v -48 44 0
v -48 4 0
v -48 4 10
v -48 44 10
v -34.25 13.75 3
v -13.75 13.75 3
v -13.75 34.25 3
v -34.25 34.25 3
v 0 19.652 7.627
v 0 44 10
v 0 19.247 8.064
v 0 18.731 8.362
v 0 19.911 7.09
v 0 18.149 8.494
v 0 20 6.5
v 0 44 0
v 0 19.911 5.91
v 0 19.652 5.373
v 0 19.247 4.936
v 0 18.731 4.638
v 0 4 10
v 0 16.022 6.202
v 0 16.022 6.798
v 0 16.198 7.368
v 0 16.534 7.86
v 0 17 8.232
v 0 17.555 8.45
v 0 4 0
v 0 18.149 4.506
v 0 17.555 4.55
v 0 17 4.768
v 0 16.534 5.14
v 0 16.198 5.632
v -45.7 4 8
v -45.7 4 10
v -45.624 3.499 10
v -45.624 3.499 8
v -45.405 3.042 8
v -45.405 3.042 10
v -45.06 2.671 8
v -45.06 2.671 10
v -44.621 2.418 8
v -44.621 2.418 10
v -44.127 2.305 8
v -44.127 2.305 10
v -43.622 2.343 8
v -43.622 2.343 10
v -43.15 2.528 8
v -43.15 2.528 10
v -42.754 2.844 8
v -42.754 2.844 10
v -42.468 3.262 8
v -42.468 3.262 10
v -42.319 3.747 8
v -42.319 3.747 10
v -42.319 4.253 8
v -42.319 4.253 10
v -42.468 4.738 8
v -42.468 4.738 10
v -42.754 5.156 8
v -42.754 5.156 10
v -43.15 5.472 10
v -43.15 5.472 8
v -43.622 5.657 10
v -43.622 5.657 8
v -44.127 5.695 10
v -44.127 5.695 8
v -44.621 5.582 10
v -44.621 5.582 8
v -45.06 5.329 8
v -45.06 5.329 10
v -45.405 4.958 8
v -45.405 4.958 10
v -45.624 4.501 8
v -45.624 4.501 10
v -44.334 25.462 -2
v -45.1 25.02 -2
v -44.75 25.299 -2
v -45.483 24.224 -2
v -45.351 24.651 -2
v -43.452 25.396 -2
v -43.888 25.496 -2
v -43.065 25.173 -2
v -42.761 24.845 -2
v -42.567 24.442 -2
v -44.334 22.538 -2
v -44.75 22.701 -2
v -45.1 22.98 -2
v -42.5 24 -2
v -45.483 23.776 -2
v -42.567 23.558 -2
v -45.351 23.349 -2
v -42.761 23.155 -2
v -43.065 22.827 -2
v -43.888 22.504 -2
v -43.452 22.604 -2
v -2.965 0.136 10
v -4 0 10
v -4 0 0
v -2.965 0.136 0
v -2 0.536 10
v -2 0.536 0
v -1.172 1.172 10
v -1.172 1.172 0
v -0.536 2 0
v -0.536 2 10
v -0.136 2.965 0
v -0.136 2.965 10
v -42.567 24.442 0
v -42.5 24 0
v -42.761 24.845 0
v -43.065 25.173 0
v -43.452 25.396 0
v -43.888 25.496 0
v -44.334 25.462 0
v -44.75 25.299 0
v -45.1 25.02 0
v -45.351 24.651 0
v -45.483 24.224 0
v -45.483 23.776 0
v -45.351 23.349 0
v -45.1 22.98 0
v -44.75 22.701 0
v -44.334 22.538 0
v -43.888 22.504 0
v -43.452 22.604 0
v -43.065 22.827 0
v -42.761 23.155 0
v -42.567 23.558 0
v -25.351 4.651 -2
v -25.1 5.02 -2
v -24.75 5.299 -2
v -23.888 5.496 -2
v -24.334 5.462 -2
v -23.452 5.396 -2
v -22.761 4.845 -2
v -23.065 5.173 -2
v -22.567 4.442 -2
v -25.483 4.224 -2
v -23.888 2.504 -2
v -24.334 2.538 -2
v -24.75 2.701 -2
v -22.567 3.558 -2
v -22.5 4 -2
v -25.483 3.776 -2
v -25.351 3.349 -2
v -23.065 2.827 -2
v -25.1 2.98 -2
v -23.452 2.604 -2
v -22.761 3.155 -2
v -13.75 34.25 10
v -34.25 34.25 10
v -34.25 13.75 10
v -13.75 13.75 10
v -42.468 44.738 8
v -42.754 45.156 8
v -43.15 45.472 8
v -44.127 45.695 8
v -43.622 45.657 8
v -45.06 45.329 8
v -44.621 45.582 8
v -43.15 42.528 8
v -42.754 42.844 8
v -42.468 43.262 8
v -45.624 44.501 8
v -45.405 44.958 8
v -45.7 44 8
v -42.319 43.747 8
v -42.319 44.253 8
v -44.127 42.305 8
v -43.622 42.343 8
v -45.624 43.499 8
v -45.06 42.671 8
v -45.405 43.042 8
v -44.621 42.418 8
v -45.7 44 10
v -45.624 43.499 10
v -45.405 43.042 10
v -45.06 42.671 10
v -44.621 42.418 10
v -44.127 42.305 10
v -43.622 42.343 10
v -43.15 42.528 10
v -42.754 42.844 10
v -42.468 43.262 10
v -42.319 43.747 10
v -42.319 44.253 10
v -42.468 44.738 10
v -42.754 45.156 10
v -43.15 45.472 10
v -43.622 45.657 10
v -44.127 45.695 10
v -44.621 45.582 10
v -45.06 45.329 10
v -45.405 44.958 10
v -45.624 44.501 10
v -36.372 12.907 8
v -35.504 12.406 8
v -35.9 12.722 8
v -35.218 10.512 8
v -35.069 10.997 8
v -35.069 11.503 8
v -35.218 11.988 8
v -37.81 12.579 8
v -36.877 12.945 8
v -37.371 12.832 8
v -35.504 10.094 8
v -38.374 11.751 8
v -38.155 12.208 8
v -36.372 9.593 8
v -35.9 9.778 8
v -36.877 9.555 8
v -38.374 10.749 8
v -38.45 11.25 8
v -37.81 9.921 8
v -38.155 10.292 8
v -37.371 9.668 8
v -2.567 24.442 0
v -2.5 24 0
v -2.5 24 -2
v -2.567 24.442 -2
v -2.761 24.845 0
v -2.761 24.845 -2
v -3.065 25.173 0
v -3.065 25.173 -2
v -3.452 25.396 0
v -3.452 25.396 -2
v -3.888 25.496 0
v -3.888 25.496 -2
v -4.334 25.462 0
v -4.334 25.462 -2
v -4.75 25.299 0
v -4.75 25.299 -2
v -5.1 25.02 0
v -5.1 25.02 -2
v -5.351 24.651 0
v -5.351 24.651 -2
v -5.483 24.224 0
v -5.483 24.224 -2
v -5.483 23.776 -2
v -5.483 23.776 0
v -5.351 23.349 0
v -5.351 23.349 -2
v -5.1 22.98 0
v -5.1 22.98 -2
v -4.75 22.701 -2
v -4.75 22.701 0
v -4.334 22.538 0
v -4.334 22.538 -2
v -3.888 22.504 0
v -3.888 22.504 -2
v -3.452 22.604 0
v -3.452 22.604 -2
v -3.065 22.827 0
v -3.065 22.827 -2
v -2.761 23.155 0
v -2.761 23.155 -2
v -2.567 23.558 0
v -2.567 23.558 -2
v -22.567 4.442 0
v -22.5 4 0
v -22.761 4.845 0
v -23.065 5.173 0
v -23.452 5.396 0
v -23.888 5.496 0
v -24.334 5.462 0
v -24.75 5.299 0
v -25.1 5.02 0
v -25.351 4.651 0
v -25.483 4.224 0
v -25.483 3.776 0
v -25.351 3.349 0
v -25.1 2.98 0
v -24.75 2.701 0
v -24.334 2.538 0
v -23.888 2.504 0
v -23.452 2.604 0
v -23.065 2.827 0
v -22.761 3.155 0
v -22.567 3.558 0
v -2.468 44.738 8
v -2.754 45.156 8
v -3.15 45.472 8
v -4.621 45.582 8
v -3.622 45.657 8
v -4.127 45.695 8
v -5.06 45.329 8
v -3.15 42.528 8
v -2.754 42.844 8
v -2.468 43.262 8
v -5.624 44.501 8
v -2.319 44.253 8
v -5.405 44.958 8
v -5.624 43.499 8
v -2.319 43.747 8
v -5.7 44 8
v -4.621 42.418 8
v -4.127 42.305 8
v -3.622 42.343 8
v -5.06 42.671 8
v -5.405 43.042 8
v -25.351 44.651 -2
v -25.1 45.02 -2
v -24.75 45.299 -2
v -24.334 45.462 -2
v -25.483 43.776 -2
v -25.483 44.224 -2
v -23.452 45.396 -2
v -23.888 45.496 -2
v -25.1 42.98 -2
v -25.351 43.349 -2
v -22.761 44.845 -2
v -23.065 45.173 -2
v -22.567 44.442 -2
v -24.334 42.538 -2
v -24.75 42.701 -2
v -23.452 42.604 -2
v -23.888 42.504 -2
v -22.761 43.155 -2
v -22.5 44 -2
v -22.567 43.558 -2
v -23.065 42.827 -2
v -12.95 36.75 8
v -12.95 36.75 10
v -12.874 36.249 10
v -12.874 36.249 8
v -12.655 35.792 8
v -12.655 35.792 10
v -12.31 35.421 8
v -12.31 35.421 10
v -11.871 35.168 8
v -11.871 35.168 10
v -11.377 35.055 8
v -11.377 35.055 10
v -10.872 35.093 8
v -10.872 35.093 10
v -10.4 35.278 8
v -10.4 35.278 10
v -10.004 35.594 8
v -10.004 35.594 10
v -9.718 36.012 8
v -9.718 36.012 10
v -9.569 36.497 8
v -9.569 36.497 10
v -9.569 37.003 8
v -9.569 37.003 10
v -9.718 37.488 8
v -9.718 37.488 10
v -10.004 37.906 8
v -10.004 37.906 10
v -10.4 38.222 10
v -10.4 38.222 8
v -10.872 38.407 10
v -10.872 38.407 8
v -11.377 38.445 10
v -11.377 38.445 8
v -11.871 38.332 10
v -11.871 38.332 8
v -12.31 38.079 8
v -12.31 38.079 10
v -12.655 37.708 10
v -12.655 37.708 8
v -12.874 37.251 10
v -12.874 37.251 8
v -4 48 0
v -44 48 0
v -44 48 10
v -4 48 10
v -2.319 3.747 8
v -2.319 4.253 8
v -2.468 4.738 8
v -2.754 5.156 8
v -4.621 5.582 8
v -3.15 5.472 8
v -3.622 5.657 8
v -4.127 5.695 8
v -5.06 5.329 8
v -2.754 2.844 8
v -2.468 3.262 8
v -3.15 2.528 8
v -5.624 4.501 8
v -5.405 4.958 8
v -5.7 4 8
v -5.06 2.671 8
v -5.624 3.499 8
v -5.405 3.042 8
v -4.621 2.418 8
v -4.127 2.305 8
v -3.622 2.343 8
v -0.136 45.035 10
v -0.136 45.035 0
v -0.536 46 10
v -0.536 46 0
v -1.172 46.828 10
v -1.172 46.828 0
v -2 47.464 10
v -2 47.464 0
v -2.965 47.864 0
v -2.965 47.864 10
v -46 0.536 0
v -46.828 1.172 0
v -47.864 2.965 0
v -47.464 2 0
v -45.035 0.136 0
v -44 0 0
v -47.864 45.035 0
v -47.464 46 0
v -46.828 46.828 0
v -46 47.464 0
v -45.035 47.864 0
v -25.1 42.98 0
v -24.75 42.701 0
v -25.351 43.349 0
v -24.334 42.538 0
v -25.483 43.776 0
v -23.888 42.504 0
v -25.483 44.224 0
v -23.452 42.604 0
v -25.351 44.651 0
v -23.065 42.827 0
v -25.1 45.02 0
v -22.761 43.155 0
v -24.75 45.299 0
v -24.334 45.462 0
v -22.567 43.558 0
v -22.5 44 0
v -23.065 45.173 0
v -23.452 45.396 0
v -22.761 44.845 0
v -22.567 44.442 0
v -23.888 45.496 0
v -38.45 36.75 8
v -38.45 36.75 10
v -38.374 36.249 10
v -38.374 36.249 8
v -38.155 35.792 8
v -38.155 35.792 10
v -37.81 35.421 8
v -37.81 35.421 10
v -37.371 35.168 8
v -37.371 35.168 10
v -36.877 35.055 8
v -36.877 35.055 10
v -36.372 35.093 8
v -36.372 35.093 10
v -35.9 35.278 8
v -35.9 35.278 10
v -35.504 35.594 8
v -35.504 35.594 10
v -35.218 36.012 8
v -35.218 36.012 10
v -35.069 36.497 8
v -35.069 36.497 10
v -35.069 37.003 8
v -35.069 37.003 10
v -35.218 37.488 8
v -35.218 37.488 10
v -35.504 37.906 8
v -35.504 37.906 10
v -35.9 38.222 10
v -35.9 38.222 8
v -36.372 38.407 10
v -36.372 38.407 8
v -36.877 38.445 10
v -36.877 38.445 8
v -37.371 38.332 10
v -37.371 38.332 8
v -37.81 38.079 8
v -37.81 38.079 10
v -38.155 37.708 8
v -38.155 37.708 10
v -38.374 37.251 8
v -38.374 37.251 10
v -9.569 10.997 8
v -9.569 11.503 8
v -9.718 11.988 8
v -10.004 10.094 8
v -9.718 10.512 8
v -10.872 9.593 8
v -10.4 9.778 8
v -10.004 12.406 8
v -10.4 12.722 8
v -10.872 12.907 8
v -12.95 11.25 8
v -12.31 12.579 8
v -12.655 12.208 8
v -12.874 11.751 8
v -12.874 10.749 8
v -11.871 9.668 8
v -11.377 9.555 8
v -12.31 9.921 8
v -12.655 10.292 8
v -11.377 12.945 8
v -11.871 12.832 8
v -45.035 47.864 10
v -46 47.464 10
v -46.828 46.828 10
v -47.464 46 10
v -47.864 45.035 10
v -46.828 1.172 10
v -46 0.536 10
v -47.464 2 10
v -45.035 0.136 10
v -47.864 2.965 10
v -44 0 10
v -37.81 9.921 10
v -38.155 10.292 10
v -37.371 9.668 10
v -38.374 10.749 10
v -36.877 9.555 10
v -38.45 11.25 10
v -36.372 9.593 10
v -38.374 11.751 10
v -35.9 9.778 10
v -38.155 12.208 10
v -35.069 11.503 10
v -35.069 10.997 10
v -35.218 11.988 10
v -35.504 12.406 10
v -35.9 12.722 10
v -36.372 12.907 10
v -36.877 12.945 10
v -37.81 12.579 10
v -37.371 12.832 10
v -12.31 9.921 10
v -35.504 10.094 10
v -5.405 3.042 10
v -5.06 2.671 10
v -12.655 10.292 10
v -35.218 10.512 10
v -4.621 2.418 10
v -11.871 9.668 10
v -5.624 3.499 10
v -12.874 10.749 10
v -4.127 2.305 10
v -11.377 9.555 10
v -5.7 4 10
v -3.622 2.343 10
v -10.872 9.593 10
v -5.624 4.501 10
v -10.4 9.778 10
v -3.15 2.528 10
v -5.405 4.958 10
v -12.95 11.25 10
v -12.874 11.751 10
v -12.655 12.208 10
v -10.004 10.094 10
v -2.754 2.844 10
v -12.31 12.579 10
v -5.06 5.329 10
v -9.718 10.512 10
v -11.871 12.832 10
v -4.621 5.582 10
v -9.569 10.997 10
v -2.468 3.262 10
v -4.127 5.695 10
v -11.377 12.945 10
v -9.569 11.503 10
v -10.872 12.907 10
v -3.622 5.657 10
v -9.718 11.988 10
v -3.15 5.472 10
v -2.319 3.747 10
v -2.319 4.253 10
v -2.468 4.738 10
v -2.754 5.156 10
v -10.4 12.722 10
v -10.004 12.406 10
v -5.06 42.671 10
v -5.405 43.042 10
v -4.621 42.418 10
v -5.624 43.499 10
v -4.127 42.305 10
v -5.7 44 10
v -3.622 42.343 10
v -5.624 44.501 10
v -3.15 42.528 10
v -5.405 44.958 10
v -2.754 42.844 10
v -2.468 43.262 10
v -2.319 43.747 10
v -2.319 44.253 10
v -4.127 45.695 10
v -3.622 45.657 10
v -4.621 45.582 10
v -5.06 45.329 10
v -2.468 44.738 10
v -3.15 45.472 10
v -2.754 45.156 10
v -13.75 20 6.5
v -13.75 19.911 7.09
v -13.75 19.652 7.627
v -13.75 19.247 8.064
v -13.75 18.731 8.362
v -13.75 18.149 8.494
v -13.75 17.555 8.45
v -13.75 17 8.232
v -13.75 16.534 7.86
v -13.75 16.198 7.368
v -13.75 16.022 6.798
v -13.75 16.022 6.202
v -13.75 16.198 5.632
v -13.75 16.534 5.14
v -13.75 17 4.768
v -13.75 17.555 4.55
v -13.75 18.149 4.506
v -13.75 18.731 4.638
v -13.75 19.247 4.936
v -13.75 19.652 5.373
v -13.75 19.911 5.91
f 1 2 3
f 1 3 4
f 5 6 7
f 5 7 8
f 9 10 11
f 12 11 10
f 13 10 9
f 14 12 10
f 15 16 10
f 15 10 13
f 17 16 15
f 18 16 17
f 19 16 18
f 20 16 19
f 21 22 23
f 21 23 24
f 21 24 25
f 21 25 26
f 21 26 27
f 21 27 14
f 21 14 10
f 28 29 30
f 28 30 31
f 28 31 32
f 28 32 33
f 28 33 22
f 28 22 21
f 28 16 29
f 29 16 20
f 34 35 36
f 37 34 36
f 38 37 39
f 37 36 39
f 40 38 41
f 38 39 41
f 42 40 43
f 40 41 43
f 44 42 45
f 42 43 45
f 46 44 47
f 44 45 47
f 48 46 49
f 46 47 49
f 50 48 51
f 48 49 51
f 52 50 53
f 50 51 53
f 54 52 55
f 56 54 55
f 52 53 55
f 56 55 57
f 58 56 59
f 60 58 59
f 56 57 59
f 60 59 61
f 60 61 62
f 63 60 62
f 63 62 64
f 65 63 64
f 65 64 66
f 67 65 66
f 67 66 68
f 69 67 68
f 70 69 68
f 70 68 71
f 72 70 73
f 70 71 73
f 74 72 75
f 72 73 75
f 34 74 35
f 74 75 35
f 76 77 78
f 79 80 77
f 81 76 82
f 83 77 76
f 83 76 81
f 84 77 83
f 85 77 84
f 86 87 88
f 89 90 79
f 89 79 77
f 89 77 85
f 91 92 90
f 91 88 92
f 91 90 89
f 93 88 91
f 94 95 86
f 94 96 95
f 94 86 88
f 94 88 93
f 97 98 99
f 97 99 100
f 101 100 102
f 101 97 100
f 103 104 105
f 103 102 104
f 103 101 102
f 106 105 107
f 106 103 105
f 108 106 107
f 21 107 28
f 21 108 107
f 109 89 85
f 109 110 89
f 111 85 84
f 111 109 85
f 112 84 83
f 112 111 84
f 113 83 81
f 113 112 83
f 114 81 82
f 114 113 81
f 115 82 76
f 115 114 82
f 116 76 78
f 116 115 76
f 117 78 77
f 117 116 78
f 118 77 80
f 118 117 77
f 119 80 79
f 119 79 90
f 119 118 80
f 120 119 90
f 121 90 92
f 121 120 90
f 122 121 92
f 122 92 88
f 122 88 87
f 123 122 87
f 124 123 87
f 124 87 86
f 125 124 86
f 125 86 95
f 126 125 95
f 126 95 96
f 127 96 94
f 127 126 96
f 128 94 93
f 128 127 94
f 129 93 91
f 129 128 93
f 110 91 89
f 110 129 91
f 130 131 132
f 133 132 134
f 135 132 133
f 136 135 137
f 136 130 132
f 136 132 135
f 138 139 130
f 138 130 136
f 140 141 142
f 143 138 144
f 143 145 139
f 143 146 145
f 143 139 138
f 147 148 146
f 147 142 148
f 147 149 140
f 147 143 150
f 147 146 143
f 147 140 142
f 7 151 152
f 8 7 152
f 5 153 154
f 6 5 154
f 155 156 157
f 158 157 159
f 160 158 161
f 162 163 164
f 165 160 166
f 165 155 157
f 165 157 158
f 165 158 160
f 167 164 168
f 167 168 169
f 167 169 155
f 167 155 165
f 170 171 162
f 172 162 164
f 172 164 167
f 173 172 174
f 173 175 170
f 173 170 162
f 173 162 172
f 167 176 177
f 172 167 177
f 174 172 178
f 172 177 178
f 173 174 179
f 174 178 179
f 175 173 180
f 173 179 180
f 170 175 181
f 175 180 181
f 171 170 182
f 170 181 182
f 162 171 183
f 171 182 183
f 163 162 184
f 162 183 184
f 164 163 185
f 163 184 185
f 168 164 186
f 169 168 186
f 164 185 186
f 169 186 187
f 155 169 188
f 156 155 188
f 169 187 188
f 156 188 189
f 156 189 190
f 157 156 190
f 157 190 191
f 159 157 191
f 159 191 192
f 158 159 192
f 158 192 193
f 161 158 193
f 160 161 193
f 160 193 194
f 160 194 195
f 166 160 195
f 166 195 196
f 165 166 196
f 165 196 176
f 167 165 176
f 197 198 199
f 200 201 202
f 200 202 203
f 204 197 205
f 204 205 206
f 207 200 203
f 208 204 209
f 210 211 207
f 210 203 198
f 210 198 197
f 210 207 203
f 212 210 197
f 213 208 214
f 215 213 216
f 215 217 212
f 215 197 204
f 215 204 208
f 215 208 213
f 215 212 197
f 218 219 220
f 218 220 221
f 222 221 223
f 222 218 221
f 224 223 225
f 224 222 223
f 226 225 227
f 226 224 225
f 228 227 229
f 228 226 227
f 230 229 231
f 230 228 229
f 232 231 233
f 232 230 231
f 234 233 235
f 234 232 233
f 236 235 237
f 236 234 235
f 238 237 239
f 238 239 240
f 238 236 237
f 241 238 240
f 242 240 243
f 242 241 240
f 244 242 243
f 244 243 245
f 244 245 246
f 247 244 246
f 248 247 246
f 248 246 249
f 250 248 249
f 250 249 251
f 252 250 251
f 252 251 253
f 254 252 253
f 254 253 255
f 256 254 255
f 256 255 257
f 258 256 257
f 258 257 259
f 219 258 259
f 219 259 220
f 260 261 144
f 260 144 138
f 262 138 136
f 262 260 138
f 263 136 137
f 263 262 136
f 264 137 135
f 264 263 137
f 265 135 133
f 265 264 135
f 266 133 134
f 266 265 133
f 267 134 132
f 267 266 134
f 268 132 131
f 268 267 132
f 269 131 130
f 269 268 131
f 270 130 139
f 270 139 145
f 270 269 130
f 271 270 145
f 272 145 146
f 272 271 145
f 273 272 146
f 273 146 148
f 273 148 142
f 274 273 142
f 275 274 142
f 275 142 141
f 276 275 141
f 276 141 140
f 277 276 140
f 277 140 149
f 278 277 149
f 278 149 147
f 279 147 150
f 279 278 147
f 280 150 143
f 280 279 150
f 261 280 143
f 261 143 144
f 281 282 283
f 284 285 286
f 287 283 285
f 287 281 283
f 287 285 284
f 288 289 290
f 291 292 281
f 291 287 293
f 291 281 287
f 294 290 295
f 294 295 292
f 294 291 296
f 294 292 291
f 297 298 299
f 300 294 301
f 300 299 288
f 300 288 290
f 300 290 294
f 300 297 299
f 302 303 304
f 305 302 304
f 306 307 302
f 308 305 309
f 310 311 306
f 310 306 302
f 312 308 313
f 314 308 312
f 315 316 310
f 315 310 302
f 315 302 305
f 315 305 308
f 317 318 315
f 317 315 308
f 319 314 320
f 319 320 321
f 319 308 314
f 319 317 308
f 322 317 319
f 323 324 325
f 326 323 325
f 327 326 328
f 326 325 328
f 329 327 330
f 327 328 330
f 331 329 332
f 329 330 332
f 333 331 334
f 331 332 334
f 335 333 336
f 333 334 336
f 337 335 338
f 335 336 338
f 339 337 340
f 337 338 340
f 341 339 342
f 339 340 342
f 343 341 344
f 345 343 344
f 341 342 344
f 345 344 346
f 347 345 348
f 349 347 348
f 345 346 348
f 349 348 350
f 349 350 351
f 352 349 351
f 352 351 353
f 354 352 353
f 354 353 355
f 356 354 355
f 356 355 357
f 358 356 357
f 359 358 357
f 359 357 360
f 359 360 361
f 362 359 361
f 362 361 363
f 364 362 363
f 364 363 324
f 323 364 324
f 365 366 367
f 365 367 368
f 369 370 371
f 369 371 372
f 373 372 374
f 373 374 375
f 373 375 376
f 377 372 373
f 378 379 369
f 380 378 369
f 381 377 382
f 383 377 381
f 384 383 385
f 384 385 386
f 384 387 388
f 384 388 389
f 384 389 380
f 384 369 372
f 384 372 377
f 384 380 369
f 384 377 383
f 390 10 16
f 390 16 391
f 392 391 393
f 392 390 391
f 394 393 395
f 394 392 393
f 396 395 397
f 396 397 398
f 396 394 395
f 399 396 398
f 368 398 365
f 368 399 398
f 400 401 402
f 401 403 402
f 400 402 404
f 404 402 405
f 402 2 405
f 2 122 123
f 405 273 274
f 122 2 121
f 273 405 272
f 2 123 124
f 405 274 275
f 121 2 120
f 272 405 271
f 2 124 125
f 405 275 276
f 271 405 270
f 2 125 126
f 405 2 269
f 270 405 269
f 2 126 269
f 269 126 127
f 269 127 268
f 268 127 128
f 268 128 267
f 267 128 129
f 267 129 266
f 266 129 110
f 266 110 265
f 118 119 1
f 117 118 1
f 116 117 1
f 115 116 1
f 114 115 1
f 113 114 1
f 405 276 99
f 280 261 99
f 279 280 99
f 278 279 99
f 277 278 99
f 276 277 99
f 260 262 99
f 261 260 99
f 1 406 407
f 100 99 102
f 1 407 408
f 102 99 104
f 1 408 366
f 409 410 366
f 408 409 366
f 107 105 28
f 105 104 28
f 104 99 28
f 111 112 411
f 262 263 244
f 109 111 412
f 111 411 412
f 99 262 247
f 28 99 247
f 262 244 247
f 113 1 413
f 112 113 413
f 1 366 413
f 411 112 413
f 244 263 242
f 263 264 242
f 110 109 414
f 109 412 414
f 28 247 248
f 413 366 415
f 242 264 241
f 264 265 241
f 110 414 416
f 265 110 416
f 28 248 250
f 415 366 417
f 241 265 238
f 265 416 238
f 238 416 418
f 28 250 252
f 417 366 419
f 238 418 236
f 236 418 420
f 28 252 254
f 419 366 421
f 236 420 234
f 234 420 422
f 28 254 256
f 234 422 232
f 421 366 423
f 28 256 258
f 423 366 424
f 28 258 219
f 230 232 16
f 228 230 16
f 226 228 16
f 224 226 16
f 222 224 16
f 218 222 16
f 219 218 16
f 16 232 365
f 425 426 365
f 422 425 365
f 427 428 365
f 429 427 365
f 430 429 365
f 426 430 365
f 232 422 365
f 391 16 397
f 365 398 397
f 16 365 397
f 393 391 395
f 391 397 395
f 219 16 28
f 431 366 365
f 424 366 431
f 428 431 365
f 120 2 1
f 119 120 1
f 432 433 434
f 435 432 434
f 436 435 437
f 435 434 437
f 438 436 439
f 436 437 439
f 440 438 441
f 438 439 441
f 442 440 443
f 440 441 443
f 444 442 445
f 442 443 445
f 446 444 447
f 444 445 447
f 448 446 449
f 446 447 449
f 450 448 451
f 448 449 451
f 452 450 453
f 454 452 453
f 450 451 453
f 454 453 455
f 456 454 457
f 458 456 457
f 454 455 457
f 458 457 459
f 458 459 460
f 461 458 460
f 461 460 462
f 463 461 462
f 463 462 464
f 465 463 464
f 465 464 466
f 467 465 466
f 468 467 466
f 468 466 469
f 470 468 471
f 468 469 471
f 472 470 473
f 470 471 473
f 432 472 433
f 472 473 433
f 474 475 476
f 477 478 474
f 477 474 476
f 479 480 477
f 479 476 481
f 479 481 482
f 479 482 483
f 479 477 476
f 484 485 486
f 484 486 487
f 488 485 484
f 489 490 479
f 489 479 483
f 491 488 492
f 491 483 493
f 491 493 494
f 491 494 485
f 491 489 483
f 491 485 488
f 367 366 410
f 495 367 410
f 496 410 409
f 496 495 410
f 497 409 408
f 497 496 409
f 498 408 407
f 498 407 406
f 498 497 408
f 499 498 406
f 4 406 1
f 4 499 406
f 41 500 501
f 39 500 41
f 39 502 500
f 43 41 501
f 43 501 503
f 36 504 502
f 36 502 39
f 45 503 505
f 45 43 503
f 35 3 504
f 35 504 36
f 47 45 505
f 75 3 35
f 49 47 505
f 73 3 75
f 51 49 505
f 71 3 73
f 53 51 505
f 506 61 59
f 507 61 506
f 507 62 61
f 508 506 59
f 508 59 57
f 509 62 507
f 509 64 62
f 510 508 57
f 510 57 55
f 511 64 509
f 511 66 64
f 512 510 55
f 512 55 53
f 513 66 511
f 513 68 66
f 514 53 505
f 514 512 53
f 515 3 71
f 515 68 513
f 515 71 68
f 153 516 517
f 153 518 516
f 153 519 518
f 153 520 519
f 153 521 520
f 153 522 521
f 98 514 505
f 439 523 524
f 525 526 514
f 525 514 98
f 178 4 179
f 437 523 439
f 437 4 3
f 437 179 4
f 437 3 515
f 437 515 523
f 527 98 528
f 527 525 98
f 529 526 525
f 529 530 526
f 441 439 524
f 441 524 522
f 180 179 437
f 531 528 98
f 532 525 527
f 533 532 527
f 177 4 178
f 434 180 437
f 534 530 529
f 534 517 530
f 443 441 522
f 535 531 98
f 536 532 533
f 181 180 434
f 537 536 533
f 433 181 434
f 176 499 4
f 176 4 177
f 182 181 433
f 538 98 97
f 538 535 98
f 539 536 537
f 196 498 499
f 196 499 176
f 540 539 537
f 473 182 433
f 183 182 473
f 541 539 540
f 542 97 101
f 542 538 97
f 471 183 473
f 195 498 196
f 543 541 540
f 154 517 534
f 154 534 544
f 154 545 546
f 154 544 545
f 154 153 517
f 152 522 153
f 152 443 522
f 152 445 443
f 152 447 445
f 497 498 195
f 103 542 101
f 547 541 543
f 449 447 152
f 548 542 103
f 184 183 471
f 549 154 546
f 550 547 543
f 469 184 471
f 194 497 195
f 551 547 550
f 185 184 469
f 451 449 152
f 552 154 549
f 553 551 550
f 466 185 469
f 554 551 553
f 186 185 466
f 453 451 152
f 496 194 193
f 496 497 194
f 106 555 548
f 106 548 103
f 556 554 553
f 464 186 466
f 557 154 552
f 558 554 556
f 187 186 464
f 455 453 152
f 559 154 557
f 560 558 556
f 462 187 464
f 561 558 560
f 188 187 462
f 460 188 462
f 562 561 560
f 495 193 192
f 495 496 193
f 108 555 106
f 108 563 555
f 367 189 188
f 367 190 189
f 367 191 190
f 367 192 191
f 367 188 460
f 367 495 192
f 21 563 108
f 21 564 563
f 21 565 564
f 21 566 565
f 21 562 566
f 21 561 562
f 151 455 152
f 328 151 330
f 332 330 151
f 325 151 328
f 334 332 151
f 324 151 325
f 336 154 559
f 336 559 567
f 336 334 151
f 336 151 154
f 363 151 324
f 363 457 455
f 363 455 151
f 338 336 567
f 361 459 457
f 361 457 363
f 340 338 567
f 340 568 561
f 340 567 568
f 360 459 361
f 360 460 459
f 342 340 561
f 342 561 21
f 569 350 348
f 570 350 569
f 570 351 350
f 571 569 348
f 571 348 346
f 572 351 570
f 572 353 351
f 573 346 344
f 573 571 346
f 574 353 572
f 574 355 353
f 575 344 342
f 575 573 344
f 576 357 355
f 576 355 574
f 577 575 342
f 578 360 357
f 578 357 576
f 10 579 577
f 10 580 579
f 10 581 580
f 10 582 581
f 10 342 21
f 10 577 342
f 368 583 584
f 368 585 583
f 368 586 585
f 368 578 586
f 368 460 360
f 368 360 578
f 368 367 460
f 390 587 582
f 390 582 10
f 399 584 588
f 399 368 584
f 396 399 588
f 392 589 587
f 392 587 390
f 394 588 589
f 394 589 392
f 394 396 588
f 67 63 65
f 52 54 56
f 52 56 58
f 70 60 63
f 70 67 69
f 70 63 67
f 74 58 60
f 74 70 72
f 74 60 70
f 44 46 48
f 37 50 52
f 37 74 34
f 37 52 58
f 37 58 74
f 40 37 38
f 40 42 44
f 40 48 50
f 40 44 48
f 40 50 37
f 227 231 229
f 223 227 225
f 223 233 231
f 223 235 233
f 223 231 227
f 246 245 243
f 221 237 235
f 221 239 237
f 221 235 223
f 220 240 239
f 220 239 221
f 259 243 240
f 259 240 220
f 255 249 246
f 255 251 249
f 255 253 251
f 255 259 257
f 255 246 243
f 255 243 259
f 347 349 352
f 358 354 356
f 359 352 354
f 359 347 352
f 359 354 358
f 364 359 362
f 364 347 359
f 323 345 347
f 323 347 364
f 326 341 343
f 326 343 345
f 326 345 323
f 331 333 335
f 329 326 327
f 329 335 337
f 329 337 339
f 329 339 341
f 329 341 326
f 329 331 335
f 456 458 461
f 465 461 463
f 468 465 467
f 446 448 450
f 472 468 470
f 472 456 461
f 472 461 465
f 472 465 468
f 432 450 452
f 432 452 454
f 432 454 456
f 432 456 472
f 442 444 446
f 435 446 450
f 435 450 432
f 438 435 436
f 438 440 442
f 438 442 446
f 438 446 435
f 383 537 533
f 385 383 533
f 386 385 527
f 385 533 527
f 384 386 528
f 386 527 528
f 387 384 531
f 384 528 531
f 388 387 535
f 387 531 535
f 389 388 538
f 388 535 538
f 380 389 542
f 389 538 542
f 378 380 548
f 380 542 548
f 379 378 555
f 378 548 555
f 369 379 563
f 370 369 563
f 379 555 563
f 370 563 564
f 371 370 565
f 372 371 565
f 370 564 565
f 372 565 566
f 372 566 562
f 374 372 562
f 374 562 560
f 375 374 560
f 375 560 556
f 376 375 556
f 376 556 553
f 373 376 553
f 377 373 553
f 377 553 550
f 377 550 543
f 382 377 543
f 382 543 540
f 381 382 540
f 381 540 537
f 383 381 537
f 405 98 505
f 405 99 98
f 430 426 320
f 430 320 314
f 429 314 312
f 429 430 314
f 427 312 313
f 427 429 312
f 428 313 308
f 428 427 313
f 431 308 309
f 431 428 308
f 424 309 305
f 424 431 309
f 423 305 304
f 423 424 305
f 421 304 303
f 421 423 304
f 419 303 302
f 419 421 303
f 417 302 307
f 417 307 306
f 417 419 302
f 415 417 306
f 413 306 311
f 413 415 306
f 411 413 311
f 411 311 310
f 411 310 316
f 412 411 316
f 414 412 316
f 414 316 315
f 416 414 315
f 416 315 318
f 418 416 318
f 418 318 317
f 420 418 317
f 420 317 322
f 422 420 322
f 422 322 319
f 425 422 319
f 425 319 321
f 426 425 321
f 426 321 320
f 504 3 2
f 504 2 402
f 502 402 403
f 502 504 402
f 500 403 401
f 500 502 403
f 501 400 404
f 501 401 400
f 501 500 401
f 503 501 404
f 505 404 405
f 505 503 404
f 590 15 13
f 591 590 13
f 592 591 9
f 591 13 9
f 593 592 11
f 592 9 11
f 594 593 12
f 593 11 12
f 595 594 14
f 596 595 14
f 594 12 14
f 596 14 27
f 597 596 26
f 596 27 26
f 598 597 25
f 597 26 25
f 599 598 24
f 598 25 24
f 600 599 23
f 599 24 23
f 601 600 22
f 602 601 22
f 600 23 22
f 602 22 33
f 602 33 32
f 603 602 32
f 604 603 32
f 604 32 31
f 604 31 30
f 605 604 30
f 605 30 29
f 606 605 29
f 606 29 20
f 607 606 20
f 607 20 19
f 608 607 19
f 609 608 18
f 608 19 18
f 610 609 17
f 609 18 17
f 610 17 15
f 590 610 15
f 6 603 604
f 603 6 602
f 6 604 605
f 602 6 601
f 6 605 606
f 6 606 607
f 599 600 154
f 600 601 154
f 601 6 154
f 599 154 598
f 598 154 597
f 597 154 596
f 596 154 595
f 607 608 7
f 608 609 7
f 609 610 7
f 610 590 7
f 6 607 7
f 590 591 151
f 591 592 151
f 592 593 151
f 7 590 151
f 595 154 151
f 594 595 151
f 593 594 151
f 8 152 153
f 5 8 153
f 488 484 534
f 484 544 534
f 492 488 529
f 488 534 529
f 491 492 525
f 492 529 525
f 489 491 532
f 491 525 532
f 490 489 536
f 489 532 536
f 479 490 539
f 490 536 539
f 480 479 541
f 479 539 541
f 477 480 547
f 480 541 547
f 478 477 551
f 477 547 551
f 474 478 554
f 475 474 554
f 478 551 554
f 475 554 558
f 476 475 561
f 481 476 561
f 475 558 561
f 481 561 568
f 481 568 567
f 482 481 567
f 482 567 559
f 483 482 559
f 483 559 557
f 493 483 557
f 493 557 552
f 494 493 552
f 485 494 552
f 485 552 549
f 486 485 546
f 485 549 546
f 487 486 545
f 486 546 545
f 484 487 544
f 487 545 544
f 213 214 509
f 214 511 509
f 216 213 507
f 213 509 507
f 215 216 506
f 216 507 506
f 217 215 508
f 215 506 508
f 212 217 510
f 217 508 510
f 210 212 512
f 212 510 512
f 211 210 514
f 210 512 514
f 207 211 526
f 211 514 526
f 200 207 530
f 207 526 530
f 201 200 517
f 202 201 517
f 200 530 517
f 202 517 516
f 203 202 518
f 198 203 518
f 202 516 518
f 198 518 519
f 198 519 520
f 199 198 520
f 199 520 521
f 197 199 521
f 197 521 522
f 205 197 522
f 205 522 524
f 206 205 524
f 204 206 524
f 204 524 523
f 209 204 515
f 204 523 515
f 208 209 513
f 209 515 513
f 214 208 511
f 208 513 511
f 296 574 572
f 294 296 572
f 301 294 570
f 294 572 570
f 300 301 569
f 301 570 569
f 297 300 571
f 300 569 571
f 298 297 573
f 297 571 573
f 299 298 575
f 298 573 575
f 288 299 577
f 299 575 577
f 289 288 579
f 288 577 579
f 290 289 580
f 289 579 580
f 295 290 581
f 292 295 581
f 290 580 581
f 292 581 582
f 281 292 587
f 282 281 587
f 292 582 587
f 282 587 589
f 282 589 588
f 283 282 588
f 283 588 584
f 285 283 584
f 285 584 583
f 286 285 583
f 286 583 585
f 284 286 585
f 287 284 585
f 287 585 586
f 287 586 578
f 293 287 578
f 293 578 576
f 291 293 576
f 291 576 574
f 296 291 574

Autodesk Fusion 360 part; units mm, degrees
sketch "Sketch1" plane through (0, 0, 0) normal (0, 0, 1) x (1, 0, 0)
  line L0 (0, 0) -> (-48, 0)
  line L1 (-48, 0) -> (-48, 48)
  line L2 (-48, 48) -> (0, 48)
  line L3 (0, 48) -> (0, 0)
  dimension "d1" = 48
  dimension "d2" = 48
extrude "Extrude1" add sketch "Sketch1" along normal blind 10
sketch "Sketch2" plane through (0, 0, 10) normal (0, 0, 1) x (-1, 0, 0)
  line L0 (0, -48) -> (48, -48)
  line L1 (48, -48) -> (48, 0)
  line L2 (48, 0) -> (0, 0)
  line L3 (0, 0) -> (0, -48)
  line L4 (34.25, -13.75) -> (13.75, -13.75)
  line L5 (13.75, -13.75) -> (13.75, -34.25)
  line L6 (13.75, -34.25) -> (34.25, -34.25)
  line L7 (34.25, -34.25) -> (34.25, -13.75)
  line L8 (34.25, -13.75) -> (13.75, -34.25) construction
  line L9 (13.75, -13.75) -> (34.25, -34.25) construction
  point P0 (24, -24)
  dimension "d5" = 20.5
  dimension "d6" = 20.5
extrude "Extrude2" cut sketch "Sketch2" against normal blind 7 contours L4 L5 L6 L7
sketch "Sketch3" plane through (0, 0, 10) normal (0, 0, 1) x (-1, 0, 0)
  line L0 (13.75, -13.75) -> (34.25, -13.75)
  line L1 (34.25, -13.75) -> (34.25, -34.25)
  line L2 (34.25, -34.25) -> (13.75, -34.25)
  line L3 (13.75, -34.25) -> (13.75, -13.75)
  line L4 (0, -48) -> (48, -48)
  line L5 (48, -48) -> (48, 0)
  line L6 (48, 0) -> (0, 0)
  line L7 (0, 0) -> (0, -48)
sketch "Sketch4" plane through (0, 0, 0) normal (1, 0, 0) x (0, 1, 0)
  line L0 (0, 0) -> (48, 0)
  line L1 (48, 0) -> (48, 10)
  line L2 (48, 10) -> (0, 10)
  line L3 (0, 10) -> (0, 0)
  line L4 (0, 10) -> (18, 10)
  line L5 (18, 10) -> (18, 6.5)
  line L6 (18, 6.5) -> (0, 6.5)
  line L7 (0, 6.5) -> (0, 10)
  circle A0 centre (18, 6.5) radius 2
  dimension "d9" = 18
  dimension "d10" = 3.5
  dimension "d11" = 4
extrude "Extrude3" cut sketch "Sketch4" against normal blind 15 contours L5 L6 A0 | L5 L6 A0
fillet "Fillet1" radius 4 1 edges at (0, 48, 5)
fillet "Fillet2" radius 4 1 edges at (0, 0, 5)
fillet "Fillet3" radius 4 2 edges at (-48, 48, 5) (-48, 0, 5)
sketch "Sketch5" plane through (0, 0, 10) normal (0, 0, 1) x (-1, 0, 0)
  line L0 (13.75, -13.75) -> (11.25, -13.75)
  line L1 (11.25, -13.75) -> (11.25, -11.25)
  line L2 (11.25, -11.25) -> (13.75, -11.25)
  line L3 (13.75, -11.25) -> (13.75, -13.75)
  line L4 (11.25, -11.25) -> (36.75, -11.25)
  line L5 (36.75, -11.25) -> (36.75, -36.75)
  line L6 (36.75, -36.75) -> (11.25, -36.75)
  line L7 (11.25, -36.75) -> (11.25, -11.25)
  circle A0 centre (36.75, -36.75) radius 1.6
  circle A1 centre (11.25, -36.75) radius 1.6
  circle A2 centre (11.25, -11.25) radius 1.6
  circle A3 centre (36.75, -11.25) radius 1.6
  point P0 (13.75, -13.75)
  dimension "d20" = 2.5
  dimension "d21" = 2.5
  dimension "d22" = 25.5
  dimension "d23" = 25.5
  dimension "d24" = 3.2
  dimension "d25" = 3.2
  dimension "d26" = 3.2
  dimension "d27" = 3.2
extrude "Extrude4" cut sketch "Sketch5" against normal blind 2 contours L1 L2 L4 L7 A2 | L1 L2 L4 L7 A2 | L6 L7 A1 | L6 L7 A1 | L4 L5 A3 | L4 L5 A3 | L5 L6 A0 | L5 L6 A0
sketch "Sketch6" plane through (0, 0, 0) normal (0, 0, -1) x (1, 0, 0)
  arc A0 (-44, 0) -> (-48, -4) centre (-44, -4) ccw
  line L0 (-48, -4) -> (-48, -44)
  arc A1 (-48, -44) -> (-44, -48) centre (-44, -44) ccw
  line L1 (-44, -48) -> (-4, -48)
  arc A2 (-4, -48) -> (0, -44) centre (-4, -44) ccw
  line L2 (0, -44) -> (0, -4)
  arc A3 (0, -4) -> (-4, 0) centre (-4, -4) ccw
  line L3 (-4, 0) -> (-44, 0)
  line L4 (0, 0) -> (-4, 0)
  line L5 (0, -4) -> (0, 0)
  circle A4 centre (-4, -44) radius 1.5
  circle A5 centre (-44, -44) radius 1.5
  circle A6 centre (-44, -4) radius 1.5
  circle A7 centre (-4, -4) radius 1.5
  dimension "d30" = 4
  dimension "d31" = 40
  dimension "d33" = 3
  dimension "d34" = 3
  dimension "d35" = 3
  dimension "d36" = 3
extrude "Extrude5" add sketch "Sketch6" along normal blind 2 contours A4 | A5 | A6 | A7
sketch "Sketch7" plane through (0, 0, 10) normal (0, 0, 1) x (-1, 0, 0)
  line L0 (0, 0) -> (4, 0)
  line L1 (4, 0) -> (4, -4)
  line L2 (4, -4) -> (0, -4)
  line L3 (0, -4) -> (0, 0)
  line L4 (4, -4) -> (44, -4)
  line L5 (44, -4) -> (44, -44)
  line L6 (44, -44) -> (4, -44)
  line L7 (4, -44) -> (4, -4)
  circle A0 centre (4, -4) radius 1.6
  circle A1 centre (44, -4) radius 1.6
  circle A2 centre (4, -44) radius 1.6
  circle A3 centre (44, -44) radius 1.6
  dimension "d39" = 4
  dimension "d40" = 4
  dimension "d41" = 40
  dimension "d42" = 40
  dimension "d43" = 3.2
  dimension "d44" = 3.2
  dimension "d45" = 3.2
  dimension "d46" = 3.2
extrude "Extrude6" cut sketch "Sketch7" against normal blind 2 contours L1 L4 A0 | L1 L2 A0 | L2 L7 A0 | L4 L7 A0 | L4 L5 A1 | L4 L5 A1 | L6 L7 A2 | L6 L7 A2 | L5 L6 A3 | L5 L6 A3
extrude "Extrude7" cut 4 faces at (-44.3721, 3.7344, -2) (-4.5584, 4.2485, -2) (-4.4413, 44.3401, -2) (-43.9601, 44.4654, -2) along direction (0, 0, 1) blind 2
sketch "Sketch8" plane through (0, 0, 0) normal (0, 0, -1) x (1, 0, 0)
  arc A0 (-44, 0) -> (-48, -4) centre (-44, -4) ccw
  line L0 (-48, -4) -> (-48, -44)
  arc A1 (-48, -44) -> (-44, -48) centre (-44, -44) ccw
  line L1 (-44, -48) -> (-4, -48)
  arc A2 (-4, -48) -> (0, -44) centre (-4, -44) ccw
  line L2 (0, -44) -> (0, -4)
  arc A3 (0, -4) -> (-4, 0) centre (-4, -4) ccw
  line L3 (-4, 0) -> (-44, 0)
  line L4 (0, 0) -> (-4, 0)
  line L5 (-4, 0) -> (-4, -4)
  line L6 (-4, -4) -> (0, -4)
  line L7 (0, -4) -> (0, 0)
  line L8 (-4, -4) -> (-44, -4)
  line L9 (-44, -4) -> (-44, -44)
  line L10 (-44, -44) -> (-4, -44)
  line L11 (-4, -44) -> (-4, -4)
  circle A4 centre (-24, -4) radius 1.5
  circle A5 centre (-24, -44) radius 1.5
  circle A6 centre (-4, -24) radius 1.5
  circle A7 centre (-44, -24) radius 1.5
  dimension "d51" = 4
  dimension "d52" = 40
  dimension "d53" = 40
  dimension "d54" = 3
  dimension "d55" = 3
  dimension "d56" = 3
  dimension "d57" = 3
extrude "Extrude8" add sketch "Sketch8" along normal blind 2 contours L8 A4 | L8 A4 | L11 A6 | L11 A6 | L9 A7 | L9 A7 | L10 A5 | L10 A5
sketch "Sketch9" plane through (0, 0, 10) normal (0, 0, 1) x (-1, 0, 0)
  circle A0 centre (4, -4) radius 1.7
  dimension "d60" = 3.4
extrude "Extrude9" cut sketch "Sketch9" against normal blind 2
sketch "Sketch10" plane through (0, 0, 10) normal (0, 0, 1) x (-1, 0, 0)
  circle A0 centre (4, -44) radius 1.7
  arc A1 (0, -44) -> (4, -48) centre (4, -44) ccw
  dimension "d63" = 3.4
extrude "Extrude10" cut sketch "Sketch10" against normal blind 2
sketch "Sketch11" plane through (0, 0, 10) normal (0, 0, 1) x (-1, 0, 0)
  circle A0 centre (44, -4) radius 1.7
  dimension "d66" = 3.4
extrude "Extrude11" cut sketch "Sketch11" against normal blind 2
sketch "Sketch12" plane through (0, 0, 10) normal (0, 0, 1) x (-1, 0, 0)
  circle A0 centre (44, -44) radius 1.7
  dimension "d69" = 3.4
extrude "Extrude12" cut sketch "Sketch12" against normal blind 2
sketch "Sketch13" plane through (0, 0, 10) normal (0, 0, 1) x (-1, 0, 0)
  circle A0 centre (11.25, -11.25) radius 1.7
  circle A1 centre (11.25, -11.25) radius 1.6
  dimension "d72" = 3.4
extrude "Extrude13" cut sketch "Sketch13" against normal blind 2
sketch "Sketch14" plane through (0, 0, 10) normal (0, 0, 1) x (-1, 0, 0)
  circle A0 centre (36.75, -11.25) radius 1.7
  circle A1 centre (36.75, -11.25) radius 1.6
  dimension "d75" = 3.4
extrude "Extrude14" cut sketch "Sketch14" against normal blind 2
sketch "Sketch15" plane through (0, 0, 10) normal (0, 0, 1) x (-1, 0, 0)
  circle A0 centre (36.75, -36.75) radius 1.7
  circle A1 centre (36.75, -36.75) radius 1.6
  dimension "d78" = 3.4
extrude "Extrude15" cut sketch "Sketch15" against normal blind 2
sketch "Sketch16" plane through (0, 0, 10) normal (0, 0, 1) x (-1, 0, 0)
  circle A0 centre (11.25, -36.75) radius 1.7
  circle A1 centre (11.25, -36.75) radius 1.6
  dimension "d81" = 3.4
extrude "Extrude16" cut sketch "Sketch16" against normal blind 2
